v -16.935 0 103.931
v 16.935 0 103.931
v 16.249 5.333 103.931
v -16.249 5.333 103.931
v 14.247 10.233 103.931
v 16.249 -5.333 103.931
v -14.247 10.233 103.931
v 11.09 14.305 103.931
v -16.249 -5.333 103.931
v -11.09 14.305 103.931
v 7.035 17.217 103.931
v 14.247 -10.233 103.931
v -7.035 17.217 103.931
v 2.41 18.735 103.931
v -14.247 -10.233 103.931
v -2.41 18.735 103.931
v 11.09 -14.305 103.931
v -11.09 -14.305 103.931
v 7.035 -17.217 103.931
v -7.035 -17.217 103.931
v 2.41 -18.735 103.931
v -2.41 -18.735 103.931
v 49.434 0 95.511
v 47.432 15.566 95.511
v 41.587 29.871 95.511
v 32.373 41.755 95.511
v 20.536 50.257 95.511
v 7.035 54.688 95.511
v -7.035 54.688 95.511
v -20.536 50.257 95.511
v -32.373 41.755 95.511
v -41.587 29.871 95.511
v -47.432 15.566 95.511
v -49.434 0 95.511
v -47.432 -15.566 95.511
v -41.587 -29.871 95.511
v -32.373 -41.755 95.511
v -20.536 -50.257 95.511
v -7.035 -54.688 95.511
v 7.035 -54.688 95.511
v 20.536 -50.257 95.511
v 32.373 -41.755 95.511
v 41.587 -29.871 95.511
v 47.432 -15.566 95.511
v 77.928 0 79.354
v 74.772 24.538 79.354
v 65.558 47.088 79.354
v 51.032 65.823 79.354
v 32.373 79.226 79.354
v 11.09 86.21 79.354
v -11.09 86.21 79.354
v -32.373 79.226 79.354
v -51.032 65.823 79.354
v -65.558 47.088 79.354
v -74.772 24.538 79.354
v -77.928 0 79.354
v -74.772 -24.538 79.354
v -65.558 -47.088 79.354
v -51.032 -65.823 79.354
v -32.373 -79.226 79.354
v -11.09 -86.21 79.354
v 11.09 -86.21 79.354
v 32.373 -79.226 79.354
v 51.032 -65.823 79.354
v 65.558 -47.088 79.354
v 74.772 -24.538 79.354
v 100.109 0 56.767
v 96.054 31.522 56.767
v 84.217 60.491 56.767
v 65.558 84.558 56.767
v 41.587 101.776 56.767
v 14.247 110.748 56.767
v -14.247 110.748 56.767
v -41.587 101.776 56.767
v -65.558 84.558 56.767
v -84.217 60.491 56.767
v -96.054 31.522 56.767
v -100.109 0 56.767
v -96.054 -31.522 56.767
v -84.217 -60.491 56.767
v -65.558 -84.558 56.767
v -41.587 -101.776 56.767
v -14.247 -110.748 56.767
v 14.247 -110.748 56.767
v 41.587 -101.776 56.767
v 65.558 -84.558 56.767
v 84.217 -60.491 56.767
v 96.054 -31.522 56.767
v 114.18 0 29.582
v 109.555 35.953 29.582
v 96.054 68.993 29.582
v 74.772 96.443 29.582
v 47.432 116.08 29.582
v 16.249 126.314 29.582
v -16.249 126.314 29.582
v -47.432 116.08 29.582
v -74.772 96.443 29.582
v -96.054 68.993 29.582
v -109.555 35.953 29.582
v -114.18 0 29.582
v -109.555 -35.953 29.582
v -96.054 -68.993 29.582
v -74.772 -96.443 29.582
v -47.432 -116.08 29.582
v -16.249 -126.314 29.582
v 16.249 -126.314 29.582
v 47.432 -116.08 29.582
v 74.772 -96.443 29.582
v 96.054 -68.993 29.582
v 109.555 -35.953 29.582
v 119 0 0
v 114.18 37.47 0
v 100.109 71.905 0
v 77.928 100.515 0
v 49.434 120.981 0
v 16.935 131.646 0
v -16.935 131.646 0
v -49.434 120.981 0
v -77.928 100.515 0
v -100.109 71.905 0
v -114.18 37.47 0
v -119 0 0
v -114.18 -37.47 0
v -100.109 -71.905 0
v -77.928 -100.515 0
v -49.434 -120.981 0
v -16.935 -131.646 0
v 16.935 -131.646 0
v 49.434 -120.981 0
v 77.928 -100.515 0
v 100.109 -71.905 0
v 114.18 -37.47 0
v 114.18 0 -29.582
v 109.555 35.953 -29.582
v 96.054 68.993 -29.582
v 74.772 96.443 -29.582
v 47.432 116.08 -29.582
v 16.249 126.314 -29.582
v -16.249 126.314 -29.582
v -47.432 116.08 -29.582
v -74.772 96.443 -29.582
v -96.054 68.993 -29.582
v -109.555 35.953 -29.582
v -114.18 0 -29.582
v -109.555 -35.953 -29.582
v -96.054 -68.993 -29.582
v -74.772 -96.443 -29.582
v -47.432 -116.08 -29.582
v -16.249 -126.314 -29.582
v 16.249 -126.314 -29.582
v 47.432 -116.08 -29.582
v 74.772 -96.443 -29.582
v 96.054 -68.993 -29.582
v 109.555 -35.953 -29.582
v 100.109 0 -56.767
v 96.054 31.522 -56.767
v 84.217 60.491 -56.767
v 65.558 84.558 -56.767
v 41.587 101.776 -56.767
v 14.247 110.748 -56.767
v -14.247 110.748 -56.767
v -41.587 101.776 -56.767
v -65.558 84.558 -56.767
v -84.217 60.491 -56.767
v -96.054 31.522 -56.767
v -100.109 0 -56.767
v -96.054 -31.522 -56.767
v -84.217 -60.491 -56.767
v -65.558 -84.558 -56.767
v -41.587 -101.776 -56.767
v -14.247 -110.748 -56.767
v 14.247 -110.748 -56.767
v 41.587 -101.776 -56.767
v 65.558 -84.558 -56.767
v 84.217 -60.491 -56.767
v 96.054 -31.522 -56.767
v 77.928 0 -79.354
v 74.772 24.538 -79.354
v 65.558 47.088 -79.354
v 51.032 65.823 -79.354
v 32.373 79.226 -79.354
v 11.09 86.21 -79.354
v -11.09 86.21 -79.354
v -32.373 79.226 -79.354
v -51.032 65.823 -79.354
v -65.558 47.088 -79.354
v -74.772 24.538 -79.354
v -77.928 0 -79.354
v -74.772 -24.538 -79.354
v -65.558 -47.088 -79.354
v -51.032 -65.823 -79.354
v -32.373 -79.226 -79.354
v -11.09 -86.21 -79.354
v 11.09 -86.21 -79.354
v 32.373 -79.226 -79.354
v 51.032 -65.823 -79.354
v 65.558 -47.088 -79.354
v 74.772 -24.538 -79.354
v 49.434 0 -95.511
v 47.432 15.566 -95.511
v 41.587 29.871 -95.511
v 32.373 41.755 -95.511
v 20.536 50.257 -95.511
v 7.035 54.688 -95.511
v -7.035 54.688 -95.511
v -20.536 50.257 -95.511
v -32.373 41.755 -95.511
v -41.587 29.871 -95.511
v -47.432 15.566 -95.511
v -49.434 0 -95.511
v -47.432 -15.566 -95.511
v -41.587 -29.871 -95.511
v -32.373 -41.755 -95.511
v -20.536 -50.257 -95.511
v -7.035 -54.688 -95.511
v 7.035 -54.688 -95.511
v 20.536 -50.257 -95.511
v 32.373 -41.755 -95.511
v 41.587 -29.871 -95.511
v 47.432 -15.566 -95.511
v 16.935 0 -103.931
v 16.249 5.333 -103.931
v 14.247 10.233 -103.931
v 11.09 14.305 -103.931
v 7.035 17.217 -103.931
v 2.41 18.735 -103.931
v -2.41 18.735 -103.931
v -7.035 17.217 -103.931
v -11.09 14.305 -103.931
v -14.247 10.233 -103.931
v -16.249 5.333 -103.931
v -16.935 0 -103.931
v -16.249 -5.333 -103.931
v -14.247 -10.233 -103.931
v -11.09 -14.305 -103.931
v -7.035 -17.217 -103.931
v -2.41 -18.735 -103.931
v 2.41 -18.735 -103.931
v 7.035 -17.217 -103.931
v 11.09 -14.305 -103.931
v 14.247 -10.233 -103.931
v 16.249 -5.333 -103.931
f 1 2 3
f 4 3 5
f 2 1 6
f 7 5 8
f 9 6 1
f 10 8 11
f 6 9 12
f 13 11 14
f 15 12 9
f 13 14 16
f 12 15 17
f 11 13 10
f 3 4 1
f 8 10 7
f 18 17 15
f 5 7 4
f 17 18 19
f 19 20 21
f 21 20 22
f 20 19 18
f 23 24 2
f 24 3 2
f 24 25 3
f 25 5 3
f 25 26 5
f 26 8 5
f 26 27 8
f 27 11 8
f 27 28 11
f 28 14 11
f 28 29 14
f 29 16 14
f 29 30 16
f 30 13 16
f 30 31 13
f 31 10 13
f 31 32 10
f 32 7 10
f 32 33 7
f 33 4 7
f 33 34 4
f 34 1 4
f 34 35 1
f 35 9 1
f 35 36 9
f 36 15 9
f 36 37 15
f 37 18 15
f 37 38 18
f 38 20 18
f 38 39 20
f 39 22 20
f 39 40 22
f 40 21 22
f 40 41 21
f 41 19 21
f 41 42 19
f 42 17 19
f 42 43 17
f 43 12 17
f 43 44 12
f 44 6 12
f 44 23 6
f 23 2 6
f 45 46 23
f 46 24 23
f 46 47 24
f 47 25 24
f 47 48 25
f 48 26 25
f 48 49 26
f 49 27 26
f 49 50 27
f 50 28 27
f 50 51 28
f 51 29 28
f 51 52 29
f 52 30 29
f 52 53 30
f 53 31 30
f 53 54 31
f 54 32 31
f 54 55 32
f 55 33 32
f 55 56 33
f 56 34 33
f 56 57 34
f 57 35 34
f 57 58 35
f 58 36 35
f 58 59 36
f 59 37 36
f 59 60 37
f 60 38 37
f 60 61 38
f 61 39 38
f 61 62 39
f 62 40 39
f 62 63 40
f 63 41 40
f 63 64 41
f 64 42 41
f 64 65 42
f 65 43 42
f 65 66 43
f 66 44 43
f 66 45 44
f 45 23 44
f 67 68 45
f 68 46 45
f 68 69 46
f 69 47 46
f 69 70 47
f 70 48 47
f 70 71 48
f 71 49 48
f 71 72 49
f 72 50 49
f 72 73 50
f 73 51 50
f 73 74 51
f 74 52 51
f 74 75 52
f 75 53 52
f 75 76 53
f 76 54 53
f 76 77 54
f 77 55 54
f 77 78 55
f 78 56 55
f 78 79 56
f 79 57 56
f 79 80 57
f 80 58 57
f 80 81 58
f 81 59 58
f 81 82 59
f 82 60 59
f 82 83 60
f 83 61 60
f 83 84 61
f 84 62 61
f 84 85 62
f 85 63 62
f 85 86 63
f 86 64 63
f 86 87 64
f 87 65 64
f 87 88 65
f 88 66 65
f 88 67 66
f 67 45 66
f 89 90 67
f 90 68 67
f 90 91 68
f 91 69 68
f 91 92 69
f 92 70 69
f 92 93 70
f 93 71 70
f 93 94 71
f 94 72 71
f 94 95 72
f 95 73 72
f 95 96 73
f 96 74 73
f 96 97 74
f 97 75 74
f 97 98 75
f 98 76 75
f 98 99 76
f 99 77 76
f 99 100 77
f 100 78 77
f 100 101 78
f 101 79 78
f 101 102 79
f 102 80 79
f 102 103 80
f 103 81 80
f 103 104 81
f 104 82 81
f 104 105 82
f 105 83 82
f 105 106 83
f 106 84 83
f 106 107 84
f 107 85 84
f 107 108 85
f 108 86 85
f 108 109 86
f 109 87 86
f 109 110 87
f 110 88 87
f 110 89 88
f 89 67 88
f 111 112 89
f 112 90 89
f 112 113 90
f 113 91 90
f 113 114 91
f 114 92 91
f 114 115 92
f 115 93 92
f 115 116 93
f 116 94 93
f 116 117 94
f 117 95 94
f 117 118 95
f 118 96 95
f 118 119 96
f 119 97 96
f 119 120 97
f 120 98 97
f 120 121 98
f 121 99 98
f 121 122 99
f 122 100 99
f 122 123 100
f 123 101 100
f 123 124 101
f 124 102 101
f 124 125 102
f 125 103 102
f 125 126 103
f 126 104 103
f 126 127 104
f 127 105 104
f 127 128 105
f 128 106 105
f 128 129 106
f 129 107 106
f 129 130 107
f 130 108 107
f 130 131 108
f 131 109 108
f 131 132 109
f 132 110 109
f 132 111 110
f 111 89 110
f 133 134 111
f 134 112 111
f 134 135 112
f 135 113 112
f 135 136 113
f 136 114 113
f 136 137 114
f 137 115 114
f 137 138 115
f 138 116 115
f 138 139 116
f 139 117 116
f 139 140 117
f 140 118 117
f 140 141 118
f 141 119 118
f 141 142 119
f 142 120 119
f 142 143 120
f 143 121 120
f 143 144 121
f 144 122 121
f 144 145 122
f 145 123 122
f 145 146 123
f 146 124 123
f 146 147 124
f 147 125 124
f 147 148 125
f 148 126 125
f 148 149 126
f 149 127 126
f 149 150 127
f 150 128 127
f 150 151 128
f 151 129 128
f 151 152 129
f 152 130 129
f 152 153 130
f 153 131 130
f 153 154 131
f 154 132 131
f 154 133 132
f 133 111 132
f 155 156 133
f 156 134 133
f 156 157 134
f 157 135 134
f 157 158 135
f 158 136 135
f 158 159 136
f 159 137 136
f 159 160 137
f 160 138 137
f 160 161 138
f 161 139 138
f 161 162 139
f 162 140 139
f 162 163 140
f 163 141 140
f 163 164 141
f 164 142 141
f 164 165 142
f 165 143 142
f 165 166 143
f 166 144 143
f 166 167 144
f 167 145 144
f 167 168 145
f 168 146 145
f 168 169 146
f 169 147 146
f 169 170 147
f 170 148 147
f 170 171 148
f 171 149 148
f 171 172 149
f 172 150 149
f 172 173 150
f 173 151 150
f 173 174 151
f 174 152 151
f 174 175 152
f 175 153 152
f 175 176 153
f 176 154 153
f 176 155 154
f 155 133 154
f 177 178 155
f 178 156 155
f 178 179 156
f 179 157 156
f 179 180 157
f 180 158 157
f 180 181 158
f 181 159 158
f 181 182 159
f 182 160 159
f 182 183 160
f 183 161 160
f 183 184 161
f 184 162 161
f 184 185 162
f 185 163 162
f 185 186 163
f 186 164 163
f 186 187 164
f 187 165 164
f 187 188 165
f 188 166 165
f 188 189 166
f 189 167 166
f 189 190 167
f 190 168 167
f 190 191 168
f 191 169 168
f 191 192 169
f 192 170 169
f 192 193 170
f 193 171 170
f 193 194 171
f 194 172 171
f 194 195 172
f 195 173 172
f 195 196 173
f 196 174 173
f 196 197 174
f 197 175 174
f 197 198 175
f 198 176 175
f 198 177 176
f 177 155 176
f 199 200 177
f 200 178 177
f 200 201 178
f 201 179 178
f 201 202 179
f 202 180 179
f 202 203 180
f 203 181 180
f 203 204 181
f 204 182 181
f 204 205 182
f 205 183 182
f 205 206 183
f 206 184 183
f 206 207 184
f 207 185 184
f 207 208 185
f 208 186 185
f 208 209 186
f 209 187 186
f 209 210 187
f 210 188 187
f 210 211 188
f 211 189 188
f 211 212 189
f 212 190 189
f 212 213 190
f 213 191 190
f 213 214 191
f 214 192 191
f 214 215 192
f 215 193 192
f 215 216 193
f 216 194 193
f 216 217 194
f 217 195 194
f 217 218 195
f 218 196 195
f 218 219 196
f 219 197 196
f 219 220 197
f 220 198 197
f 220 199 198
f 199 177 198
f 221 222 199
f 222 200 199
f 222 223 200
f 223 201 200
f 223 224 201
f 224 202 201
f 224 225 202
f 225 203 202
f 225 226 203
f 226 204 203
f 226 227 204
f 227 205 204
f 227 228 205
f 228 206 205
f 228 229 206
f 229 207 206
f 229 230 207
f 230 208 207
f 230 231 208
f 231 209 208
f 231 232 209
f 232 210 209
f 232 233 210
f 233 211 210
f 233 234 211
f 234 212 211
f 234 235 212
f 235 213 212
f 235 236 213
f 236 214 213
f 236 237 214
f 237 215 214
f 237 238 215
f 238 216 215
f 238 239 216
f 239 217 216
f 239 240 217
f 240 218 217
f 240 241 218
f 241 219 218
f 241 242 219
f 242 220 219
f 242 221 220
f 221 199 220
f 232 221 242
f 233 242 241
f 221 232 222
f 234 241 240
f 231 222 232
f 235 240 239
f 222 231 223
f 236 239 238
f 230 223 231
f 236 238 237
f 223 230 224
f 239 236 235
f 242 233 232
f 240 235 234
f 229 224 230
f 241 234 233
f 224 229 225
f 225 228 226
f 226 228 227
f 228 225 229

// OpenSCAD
// Generated by SolidPython 1.0.1 on 2020-07-29 00:46:53


scale(v = [17, 19, 15]) {
	sphere(r = 7);
}
/***********************************************
*********      SolidPython code:      **********
************************************************
 
# import packages: SolidPython
from solid import *
from solid.utils import *
from itertools import chain, combinations, permutations


class Resize:

    def __init__(self, scad_file):
        self.scad_file = scad_file
        #self.scad_file = import_scad(scad_file)
        # cone/cylinder param:
        self.r1 = 0
        self.r2 = 0
        self.h = 0
        # rectangular prism param:
        self.w = 0
        self.l = 0
        # ellipse param:
        self.r = 0

    # import OpenScad code (file name corresponds to shape)


    # classify shape + parameters
    def assign(self, param1, param2, param3):
        if self.scad_file == 'cone.scad':
            self.r1 = param1
            self.r2 = param2
            self.h = param3
        elif self.scad_file == 'cylinder.scad':
            self.r1 = param1
            self.r2 = param2
            self.h = param3
        elif self.scad_file == 'rectangularPrism.scad':
            self.h = param1
            self.l = param2
            self.w = param3
        else:
            self.r = param1
            self.h = param2

    # resize parameters
    def iterate(self):
        x = range(3, 20, 2)
        i = 1
        if self.scad_file == 'cone.scad':
            tempList = list(permutations(x, 2))
            for temp in tempList:
                param1 = temp[0]
                param2 = temp[1]
                filepath = 'produced_scad_files/' + 'cone' + str(param1) + '_' + str(param2) + '_' + '.scad'
                scad_render_to_file(cylinder(h=param1, r1=param2, r2=0), filepath)

        elif self.scad_file == 'cylinder.scad':
            tempList = list(permutations(x, 3))
            for temp in tempList:
                param1 = temp[0]
                param2 = temp[1]
                filepath = 'produced_scad_files/' + 'cylinder' + str(param1) + '_' + str(param2) + '_' + '.scad'
                scad_render_to_file(cylinder(h=param1, r1=param2, r2=param2), filepath)

        elif self.scad_file == 'rectangularPrism.scad':
            tempList = list(permutations(x, 3))
            for temp in tempList:
                param1 = temp[0]
                param2 = temp[1]
                param3 = temp[2]
                filepath = 'produced_scad_files/' + 'rectangularPrism' + str(param1) + '_' + str(param2) + '_' + str(
                    param3) + '.scad'
                scad_render_to_file(cube(size=(param1, param2, param3)), filepath)

        elif self.scad_file == 'ellipse.scad':
            tempList = list(permutations(x, 4))
            for temp in tempList:
                param1 = temp[0]
                param2 = temp[1]
                param3 = temp[2]
                param4 = temp[3]
                filepath = 'produced_scad_files/' + 'ellipse' + str(param1) + '_' + str(param2) + '_' + str(param3) + '_' + str(param4) + '.scad'
                scad_render_to_file(scale([param1, param2, param3])(sphere(r=param4)), filepath)

    def render_to_scadfile(self):
        scad_render_to_file(scad, 'example.scad') 
 
************************************************/
